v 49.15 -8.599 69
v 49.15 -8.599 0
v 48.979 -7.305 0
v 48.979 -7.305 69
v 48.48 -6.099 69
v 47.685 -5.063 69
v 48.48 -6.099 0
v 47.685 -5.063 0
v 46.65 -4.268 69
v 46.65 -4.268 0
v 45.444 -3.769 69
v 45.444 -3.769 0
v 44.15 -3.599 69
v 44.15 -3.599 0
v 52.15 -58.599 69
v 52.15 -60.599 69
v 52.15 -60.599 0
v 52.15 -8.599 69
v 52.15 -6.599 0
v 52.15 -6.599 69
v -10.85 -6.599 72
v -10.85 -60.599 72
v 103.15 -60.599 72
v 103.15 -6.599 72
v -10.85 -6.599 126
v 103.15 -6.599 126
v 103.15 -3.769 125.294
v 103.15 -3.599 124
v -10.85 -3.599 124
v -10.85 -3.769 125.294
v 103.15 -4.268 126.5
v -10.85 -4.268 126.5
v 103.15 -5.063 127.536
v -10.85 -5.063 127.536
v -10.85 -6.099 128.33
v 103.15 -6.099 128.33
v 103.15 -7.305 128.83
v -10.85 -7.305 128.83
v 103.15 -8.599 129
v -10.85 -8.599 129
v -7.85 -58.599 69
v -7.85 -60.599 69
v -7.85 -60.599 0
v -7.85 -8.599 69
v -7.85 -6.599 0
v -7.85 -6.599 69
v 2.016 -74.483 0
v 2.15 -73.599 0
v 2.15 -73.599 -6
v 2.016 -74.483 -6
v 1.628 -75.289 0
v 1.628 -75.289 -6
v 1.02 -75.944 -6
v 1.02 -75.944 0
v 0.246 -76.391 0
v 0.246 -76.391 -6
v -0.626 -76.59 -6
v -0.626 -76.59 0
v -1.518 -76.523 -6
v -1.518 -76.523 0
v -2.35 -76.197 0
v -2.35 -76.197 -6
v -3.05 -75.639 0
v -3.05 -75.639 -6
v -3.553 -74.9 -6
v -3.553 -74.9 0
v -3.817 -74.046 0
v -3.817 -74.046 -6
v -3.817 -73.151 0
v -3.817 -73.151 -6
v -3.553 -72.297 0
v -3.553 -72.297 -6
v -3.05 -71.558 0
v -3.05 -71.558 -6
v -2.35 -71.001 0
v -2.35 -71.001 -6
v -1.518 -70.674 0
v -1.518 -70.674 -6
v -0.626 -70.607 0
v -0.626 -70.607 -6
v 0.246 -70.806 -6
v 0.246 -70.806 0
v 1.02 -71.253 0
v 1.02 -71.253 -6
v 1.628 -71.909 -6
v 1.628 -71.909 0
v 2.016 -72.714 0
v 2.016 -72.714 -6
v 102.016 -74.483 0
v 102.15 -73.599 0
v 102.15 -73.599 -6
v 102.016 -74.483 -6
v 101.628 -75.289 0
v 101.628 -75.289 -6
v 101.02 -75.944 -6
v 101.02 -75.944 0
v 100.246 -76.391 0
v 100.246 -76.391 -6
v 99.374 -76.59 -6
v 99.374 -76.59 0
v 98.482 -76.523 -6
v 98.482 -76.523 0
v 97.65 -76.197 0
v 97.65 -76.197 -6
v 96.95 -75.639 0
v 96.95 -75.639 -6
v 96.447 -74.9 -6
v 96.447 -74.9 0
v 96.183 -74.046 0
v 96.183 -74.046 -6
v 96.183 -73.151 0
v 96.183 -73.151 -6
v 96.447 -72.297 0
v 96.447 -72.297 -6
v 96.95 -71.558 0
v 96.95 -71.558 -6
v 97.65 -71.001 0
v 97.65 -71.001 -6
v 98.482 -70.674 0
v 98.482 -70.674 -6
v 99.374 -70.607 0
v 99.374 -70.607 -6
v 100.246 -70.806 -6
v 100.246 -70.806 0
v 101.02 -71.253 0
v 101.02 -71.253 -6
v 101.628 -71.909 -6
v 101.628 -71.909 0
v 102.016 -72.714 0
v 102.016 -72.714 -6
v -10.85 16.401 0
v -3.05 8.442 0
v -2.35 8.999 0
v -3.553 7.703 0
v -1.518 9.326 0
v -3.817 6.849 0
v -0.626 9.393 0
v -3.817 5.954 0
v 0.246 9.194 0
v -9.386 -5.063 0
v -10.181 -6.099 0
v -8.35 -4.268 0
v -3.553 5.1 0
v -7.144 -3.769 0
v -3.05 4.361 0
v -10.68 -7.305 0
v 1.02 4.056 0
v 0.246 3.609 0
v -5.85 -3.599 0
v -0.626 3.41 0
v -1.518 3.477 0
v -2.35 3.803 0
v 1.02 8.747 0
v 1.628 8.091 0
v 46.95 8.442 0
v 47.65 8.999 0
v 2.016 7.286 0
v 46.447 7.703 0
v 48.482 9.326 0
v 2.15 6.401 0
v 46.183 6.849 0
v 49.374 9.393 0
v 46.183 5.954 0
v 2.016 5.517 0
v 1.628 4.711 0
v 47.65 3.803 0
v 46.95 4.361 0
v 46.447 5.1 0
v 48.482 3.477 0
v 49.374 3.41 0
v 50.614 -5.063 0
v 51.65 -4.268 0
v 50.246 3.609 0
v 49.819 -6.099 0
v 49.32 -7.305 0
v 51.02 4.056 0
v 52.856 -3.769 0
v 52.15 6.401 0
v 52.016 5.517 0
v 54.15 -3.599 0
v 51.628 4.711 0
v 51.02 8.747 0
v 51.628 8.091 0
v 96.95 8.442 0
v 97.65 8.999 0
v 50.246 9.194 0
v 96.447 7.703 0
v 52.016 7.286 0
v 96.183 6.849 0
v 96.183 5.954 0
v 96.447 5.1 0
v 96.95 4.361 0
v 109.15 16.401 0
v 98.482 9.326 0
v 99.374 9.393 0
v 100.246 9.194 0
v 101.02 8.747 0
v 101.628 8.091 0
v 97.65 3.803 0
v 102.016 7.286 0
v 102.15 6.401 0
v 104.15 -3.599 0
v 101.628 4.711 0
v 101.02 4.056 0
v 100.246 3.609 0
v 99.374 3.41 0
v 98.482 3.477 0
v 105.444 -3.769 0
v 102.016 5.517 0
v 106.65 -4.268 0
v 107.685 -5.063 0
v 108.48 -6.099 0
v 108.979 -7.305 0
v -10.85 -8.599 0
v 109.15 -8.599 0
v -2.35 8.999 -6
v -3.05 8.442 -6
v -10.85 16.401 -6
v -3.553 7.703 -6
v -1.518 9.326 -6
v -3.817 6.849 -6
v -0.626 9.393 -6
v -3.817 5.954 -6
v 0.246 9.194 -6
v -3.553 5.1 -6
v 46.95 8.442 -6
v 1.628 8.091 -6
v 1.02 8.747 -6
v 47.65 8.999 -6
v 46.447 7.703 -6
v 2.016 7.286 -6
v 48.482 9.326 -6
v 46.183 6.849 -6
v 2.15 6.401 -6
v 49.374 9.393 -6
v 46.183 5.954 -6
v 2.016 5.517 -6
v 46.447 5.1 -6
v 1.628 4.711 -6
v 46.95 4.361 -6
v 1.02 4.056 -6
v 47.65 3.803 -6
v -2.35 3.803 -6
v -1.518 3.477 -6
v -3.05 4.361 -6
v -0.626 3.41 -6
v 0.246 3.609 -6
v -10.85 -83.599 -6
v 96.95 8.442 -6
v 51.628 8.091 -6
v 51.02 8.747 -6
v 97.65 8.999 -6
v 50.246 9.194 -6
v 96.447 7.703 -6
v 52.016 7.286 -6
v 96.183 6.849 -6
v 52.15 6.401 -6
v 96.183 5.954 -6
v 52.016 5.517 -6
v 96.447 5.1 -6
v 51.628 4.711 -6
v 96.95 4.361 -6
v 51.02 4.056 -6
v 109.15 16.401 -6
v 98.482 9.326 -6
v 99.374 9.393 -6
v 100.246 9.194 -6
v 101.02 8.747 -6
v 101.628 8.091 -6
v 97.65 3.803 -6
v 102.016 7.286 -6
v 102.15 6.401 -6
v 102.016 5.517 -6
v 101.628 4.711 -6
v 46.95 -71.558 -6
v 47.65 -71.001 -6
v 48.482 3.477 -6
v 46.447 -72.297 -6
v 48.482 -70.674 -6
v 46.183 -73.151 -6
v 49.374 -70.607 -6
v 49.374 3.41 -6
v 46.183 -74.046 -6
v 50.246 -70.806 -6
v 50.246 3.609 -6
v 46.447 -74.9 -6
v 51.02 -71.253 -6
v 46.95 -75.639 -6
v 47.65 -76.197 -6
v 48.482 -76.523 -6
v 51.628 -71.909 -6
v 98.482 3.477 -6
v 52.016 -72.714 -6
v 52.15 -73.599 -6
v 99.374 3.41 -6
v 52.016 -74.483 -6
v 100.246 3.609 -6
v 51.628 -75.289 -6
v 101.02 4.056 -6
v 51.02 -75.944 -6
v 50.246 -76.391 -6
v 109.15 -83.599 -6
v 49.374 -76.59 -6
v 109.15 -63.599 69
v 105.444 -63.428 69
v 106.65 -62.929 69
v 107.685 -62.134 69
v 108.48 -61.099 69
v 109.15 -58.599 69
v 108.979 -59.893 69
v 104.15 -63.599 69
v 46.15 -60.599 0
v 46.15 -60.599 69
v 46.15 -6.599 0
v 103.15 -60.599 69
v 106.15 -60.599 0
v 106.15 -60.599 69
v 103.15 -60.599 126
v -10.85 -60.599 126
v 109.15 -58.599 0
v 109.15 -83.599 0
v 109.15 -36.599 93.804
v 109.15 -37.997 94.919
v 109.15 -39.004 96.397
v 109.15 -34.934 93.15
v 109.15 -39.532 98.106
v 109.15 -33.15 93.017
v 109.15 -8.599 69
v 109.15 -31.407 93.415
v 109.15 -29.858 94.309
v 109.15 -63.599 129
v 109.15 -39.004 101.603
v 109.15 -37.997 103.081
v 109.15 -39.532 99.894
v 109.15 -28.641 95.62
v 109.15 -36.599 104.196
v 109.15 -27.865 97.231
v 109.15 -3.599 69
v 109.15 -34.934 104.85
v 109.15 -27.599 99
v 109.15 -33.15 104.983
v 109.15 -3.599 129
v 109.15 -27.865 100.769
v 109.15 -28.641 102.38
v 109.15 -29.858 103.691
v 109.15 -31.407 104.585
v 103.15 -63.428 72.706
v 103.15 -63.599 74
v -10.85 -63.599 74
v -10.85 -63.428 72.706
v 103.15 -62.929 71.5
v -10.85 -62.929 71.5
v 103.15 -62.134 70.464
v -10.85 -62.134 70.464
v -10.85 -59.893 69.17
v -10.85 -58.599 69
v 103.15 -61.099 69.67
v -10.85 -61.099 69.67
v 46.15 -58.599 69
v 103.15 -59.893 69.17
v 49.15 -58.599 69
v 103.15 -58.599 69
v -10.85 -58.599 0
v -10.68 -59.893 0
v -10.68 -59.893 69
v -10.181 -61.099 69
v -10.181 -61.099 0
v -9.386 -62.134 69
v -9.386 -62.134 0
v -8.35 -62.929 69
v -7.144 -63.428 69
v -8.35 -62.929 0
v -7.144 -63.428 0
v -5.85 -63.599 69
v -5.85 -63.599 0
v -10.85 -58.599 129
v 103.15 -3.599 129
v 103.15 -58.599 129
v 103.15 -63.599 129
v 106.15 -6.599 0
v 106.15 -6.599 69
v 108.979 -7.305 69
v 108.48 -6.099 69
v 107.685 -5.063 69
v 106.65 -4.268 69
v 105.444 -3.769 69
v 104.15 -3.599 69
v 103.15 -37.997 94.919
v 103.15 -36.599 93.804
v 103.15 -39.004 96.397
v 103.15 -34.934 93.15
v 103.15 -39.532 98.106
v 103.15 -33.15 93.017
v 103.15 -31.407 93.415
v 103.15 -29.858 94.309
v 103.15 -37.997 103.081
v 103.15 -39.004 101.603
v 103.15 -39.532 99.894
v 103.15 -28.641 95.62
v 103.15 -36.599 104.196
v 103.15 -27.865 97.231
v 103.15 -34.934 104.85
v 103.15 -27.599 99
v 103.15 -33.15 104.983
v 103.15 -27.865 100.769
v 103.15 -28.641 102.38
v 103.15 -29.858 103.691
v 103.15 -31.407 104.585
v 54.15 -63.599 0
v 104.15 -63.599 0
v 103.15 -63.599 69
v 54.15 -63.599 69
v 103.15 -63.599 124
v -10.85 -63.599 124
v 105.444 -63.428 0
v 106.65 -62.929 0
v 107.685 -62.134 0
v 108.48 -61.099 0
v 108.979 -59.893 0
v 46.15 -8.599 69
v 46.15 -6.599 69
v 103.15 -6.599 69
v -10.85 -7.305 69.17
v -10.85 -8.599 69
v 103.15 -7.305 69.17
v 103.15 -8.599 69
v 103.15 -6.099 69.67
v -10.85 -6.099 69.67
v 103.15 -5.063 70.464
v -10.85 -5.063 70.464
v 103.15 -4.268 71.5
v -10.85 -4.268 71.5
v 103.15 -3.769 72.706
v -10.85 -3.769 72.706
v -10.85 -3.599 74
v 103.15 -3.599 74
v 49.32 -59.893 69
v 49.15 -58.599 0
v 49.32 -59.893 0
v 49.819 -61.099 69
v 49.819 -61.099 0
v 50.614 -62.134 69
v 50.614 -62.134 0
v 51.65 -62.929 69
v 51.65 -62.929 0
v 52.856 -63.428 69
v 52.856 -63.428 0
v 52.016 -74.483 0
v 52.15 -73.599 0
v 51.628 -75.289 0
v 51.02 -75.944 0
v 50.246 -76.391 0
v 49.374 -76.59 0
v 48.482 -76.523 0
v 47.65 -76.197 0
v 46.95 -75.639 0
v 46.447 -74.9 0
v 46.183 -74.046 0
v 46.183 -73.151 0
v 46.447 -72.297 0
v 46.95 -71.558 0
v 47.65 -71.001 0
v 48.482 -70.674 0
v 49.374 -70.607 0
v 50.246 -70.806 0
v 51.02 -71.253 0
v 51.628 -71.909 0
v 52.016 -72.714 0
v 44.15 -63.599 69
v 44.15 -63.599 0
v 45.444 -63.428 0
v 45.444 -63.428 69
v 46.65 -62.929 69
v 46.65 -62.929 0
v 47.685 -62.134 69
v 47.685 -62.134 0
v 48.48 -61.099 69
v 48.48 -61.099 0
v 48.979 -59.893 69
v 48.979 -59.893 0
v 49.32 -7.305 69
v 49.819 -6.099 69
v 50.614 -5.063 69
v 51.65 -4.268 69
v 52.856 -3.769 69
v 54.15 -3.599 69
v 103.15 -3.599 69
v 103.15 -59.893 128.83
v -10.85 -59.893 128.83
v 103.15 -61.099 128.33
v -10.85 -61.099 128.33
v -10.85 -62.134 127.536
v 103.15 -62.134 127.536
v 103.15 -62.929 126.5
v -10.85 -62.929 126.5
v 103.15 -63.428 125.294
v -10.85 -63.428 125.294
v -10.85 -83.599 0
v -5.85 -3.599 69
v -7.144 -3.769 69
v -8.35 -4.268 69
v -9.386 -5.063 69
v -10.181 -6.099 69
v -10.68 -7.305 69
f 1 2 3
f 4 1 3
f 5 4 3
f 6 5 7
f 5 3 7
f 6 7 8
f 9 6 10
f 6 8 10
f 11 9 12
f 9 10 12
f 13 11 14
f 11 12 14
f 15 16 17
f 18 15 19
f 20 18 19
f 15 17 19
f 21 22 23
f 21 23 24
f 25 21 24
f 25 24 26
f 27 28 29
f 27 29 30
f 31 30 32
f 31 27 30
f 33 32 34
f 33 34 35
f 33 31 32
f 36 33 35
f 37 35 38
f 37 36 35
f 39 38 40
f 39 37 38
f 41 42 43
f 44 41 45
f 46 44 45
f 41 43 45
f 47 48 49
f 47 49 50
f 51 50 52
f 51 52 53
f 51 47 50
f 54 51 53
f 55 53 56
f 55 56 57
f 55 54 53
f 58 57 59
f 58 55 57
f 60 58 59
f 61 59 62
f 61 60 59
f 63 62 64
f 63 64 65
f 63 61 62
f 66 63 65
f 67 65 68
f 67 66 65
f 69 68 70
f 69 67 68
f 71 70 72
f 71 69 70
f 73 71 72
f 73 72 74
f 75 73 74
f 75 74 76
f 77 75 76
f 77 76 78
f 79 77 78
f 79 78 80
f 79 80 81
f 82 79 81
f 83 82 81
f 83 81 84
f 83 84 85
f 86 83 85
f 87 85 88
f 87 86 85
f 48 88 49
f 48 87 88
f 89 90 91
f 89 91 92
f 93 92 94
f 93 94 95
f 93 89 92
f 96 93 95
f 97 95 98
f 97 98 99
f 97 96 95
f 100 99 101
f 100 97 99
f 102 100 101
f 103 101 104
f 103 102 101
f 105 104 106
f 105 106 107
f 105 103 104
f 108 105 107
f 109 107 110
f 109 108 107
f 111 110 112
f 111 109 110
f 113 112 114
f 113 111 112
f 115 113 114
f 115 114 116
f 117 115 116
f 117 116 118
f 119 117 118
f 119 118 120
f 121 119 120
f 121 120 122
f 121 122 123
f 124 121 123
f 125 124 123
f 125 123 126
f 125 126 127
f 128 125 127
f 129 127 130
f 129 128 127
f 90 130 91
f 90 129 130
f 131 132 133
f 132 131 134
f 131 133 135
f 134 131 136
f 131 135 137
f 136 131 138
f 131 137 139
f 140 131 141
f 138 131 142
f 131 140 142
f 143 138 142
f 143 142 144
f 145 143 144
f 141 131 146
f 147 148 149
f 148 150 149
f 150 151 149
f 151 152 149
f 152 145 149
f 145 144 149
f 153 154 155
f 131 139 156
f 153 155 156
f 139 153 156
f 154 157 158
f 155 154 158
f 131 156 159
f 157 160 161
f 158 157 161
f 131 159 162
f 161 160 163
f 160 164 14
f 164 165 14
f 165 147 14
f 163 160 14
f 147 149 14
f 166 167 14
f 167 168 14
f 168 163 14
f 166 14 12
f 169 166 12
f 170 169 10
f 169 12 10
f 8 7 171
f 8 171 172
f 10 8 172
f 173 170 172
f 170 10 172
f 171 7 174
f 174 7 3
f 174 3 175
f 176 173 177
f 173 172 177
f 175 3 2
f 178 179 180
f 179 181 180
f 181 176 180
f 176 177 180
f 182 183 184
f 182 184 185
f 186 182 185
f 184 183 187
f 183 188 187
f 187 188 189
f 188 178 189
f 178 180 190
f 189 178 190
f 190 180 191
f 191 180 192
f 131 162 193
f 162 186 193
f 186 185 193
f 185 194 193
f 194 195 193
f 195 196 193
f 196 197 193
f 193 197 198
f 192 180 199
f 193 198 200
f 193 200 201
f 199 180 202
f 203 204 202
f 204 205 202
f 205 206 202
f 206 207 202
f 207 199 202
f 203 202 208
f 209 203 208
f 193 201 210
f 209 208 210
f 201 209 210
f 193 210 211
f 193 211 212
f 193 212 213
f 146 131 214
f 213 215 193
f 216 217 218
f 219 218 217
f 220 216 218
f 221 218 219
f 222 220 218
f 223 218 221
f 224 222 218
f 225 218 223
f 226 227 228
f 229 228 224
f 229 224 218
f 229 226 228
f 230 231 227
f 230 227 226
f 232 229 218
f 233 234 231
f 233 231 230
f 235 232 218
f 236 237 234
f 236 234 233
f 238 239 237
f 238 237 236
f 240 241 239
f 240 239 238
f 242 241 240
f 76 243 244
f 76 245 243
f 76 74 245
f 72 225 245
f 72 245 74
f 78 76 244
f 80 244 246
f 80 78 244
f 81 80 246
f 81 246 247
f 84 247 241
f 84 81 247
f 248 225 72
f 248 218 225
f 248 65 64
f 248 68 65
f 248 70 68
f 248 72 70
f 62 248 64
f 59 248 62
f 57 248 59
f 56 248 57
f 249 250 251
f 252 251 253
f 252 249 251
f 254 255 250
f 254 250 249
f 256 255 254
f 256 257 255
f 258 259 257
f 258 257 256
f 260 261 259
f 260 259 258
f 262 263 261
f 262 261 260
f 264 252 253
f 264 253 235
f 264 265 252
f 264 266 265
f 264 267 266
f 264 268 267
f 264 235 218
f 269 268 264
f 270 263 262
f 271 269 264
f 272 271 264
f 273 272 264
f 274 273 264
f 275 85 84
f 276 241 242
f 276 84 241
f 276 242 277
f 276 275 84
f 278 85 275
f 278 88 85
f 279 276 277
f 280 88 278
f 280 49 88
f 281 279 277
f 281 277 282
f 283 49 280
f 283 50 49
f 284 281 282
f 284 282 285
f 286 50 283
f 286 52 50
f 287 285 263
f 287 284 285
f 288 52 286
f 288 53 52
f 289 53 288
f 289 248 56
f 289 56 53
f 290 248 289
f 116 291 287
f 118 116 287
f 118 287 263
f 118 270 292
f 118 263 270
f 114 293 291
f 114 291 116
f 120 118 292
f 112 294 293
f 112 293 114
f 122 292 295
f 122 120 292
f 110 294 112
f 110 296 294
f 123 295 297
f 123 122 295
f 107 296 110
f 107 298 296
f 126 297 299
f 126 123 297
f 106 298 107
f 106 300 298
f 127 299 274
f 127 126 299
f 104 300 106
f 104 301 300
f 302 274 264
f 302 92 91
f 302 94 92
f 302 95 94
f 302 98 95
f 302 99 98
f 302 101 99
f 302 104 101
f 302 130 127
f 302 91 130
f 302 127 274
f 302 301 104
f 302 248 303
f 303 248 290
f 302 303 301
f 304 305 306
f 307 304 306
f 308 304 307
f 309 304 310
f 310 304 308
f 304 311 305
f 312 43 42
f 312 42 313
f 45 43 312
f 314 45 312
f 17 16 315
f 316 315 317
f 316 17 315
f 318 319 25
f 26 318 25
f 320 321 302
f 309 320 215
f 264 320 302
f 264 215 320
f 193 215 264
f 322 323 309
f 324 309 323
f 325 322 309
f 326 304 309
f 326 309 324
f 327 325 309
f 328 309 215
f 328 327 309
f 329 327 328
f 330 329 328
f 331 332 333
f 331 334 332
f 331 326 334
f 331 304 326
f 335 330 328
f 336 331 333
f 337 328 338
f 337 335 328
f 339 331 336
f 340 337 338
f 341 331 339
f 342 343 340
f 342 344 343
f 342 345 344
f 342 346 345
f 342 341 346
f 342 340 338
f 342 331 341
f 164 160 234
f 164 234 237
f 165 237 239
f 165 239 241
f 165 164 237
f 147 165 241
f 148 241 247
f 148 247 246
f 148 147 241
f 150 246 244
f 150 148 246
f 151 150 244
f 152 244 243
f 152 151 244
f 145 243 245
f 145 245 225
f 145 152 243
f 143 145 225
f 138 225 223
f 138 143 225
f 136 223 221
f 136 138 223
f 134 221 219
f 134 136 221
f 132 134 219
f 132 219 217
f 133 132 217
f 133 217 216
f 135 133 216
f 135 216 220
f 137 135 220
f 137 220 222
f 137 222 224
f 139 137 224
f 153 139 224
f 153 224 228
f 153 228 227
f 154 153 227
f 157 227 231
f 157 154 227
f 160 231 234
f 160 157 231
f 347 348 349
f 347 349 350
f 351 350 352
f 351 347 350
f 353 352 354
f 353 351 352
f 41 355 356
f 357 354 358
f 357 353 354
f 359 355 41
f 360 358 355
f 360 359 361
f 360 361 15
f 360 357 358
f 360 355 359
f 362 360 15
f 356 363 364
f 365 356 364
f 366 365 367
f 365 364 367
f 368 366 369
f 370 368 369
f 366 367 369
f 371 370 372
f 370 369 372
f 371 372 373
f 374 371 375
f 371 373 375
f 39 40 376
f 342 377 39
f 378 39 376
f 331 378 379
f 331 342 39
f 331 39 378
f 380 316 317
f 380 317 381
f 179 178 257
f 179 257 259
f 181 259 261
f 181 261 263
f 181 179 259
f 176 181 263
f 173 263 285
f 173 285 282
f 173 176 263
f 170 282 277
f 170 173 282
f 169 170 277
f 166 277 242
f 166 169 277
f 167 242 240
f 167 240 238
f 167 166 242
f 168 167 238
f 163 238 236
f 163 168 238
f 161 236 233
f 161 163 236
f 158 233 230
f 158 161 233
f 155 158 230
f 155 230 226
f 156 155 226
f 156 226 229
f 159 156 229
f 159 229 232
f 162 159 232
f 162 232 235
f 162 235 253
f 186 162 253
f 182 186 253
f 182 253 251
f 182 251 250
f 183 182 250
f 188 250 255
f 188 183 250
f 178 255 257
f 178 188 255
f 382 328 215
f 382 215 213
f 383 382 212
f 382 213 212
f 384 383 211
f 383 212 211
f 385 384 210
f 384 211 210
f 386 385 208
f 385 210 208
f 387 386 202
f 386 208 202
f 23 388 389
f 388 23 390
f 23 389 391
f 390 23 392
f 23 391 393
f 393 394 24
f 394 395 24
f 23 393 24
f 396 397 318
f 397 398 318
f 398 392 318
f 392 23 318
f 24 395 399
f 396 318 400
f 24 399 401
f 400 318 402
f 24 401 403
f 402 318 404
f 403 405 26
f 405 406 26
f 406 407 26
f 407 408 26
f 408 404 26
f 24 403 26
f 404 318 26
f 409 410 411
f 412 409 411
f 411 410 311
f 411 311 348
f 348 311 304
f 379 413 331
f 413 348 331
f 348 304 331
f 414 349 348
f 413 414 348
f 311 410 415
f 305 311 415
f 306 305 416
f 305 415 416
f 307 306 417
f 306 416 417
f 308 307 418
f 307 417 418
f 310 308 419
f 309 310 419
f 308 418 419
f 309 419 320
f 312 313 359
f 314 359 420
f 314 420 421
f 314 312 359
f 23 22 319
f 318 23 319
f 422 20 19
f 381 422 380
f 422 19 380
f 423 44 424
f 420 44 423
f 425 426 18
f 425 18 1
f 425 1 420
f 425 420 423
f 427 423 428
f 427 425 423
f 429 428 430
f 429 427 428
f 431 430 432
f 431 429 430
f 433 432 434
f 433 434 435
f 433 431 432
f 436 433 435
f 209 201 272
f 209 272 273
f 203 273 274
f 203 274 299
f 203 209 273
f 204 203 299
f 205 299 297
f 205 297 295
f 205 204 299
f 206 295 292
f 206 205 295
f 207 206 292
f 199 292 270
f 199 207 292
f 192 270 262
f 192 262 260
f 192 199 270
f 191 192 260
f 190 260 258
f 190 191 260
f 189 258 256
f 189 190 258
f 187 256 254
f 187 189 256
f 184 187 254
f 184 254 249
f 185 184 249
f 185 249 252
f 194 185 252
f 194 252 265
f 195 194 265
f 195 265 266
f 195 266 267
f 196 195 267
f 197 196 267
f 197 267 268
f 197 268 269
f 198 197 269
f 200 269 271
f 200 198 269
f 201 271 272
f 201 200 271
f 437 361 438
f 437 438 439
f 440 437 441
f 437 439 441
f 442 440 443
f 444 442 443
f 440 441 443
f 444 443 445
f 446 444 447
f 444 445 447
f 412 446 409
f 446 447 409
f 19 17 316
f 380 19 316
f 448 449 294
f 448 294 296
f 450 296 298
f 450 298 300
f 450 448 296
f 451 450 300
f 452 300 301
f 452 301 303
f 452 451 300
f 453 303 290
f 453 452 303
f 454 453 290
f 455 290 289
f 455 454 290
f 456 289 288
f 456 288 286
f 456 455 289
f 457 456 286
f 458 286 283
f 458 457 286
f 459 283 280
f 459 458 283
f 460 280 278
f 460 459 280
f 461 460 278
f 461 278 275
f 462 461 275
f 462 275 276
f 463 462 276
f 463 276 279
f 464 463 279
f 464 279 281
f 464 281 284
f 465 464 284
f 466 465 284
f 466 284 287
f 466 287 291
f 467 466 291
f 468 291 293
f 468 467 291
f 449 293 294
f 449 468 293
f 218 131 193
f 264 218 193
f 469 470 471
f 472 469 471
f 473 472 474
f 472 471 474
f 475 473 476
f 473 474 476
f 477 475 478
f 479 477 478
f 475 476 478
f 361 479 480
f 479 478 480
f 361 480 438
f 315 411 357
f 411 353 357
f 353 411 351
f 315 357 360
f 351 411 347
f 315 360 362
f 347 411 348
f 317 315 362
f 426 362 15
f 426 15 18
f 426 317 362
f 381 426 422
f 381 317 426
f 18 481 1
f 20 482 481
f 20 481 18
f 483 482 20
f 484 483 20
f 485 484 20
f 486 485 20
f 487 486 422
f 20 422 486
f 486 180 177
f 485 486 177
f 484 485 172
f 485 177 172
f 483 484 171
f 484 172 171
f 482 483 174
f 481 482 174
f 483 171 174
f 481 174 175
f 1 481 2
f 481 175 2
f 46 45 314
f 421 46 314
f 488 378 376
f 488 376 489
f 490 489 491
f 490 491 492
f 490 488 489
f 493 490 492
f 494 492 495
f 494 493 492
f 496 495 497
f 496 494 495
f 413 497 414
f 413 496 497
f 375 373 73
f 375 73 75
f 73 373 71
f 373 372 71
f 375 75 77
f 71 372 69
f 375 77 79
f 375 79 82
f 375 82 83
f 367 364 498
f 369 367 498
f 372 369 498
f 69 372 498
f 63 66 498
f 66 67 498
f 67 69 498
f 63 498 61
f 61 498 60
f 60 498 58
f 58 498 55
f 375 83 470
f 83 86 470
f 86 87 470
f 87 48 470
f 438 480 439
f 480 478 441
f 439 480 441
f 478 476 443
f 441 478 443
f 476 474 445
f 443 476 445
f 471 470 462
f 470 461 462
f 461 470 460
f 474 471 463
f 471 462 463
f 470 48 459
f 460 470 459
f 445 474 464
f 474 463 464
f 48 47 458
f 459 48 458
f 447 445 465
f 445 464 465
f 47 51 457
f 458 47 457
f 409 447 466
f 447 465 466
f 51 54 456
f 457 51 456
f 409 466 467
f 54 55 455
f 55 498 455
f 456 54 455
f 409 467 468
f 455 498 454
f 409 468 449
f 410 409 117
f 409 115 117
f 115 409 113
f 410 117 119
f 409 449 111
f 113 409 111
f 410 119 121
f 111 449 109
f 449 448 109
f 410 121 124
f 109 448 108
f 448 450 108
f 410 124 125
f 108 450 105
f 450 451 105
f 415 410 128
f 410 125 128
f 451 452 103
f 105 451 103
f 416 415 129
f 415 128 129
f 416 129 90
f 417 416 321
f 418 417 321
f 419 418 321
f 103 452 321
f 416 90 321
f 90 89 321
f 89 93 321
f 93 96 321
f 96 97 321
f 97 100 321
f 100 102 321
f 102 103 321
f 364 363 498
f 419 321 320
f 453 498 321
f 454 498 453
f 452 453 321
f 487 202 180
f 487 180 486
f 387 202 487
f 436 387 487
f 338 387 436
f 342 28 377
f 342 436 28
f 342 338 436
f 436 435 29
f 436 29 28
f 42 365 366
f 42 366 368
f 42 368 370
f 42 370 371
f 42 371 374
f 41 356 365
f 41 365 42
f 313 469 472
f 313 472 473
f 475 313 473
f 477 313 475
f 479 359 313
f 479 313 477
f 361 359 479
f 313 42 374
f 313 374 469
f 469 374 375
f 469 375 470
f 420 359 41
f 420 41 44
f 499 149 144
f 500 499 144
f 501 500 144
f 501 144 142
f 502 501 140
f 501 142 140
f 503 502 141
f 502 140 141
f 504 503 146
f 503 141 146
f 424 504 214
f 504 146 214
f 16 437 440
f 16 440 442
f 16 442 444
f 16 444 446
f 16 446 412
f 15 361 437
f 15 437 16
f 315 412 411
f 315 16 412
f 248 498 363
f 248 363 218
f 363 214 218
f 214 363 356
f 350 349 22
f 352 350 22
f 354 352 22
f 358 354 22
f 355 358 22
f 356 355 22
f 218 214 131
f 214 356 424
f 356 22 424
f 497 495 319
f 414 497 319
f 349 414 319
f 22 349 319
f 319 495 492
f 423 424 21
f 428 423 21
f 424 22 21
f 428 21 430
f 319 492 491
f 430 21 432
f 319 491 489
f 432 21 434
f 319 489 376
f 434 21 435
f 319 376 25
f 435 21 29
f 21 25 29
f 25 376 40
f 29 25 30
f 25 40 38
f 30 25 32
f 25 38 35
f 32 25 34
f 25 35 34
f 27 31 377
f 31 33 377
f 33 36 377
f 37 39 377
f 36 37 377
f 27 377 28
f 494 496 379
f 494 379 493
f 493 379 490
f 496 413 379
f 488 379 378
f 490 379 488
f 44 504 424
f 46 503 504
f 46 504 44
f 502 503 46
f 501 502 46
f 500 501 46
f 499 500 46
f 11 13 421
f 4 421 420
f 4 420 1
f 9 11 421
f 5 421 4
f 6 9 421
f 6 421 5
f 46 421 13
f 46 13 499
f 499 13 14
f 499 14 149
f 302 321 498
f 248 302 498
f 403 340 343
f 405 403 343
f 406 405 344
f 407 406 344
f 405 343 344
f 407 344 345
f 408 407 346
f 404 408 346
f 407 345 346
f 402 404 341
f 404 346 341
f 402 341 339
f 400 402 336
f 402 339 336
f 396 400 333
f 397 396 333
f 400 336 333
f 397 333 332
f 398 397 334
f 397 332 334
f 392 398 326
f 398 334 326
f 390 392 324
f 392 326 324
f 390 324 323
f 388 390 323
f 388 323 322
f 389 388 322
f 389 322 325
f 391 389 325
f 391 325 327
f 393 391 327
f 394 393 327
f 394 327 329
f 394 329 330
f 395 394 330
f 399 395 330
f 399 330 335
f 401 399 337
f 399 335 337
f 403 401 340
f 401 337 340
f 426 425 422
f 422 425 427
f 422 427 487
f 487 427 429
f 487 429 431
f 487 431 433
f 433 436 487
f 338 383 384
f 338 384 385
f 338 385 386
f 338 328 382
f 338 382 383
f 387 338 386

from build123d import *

# Parameters (mm, degrees)
F0_W     = 54
F0_H     = 54
F1_DEPTH = 69
F2_R     = 3
F2_W     = 54
F2_H     = 54
F3_DEPTH = 6
F4_W     = 54
F4_H     = 54
F5_DEPTH = 120
F6_W     = 60
F6_H     = 60
F6_R     = 6
F7_DEPTH = 6


with BuildPart() as f1:
    # F0 (on Top) → F1 (new body)
    with BuildSketch(Plane.XY):
        with BuildLine():
            ThreePointArc((-5.85040465, -3.5986092687), (-9.3859385559, -5.0630753627), (-10.85040465, -8.5986092687))
            Line((-10.85040465, -8.5986092687), (-10.85040465, -58.5986092687))
            ThreePointArc((-10.85040465, -58.5986092687), (-9.3859385559, -62.1341431746), (-5.85040465, -63.5986092687))
            Line((-5.85040465, -63.5986092687), (44.14959535, -63.5986092687))
            ThreePointArc((44.14959535, -63.5986092687), (47.685129256, -62.1341431746), (49.14959535, -58.5986092687))
            Line((49.14959535, -58.5986092687), (49.14959535, -8.5986092687))
            ThreePointArc((49.14959535, -8.5986092687), (47.685129256, -5.0630753627), (44.14959535, -3.5986092687))
            Line((44.14959535, -3.5986092687), (-5.85040465, -3.5986092687))
        make_face()
        with Locations((19.14959535, -33.5986092687)):
            Rectangle(F0_W, F0_H, mode=Mode.SUBTRACT)
        with BuildLine():
            ThreePointArc((54.14959535, -3.5986092687), (50.6140614441, -5.0630753627), (49.14959535, -8.5986092687))
            Line((49.14959535, -8.5986092687), (49.14959535, -58.5986092687))
            ThreePointArc((49.14959535, -58.5986092687), (50.6140614441, -62.1341431746), (54.14959535, -63.5986092687))
            Line((54.14959535, -63.5986092687), (104.14959535, -63.5986092687))
            ThreePointArc((104.14959535, -63.5986092687), (107.685129256, -62.1341431746), (109.14959535, -58.5986092687))
            Line((109.14959535, -58.5986092687), (109.14959535, -8.5986092687))
            ThreePointArc((109.14959535, -8.5986092687), (107.685129256, -5.0630753627), (104.14959535, -3.5986092687))
            Line((104.14959535, -3.5986092687), (54.14959535, -3.5986092687))
        make_face()
        with Locations((79.14959535, -33.5986092687)):
            Rectangle(F0_W, F0_H, mode=Mode.SUBTRACT)
    extrude(amount=F1_DEPTH)

    # F2 (on face) → F3 (join)
    with BuildSketch(Plane(origin=(0, 0, 0), x_dir=(1, 0, 0), z_dir=(0, 0, -1))):
        with BuildLine():
            Line((-10.85040465, -16.4013907313), (109.14959535, -16.4013907313))
            Line((109.14959535, -16.4013907313), (109.14959535, 8.5986092687))
            ThreePointArc((109.14959535, 8.5986092687), (107.685129256, 5.0630753627), (104.14959535, 3.5986092687))
            Line((104.14959535, 3.5986092687), (54.14959535, 3.5986092687))
            ThreePointArc((54.14959535, 3.5986092687), (50.6140614441, 5.0630753627), (49.14959535, 8.5986092687))
            ThreePointArc((49.14959535, 8.5986092687), (47.685129256, 5.0630753627), (44.14959535, 3.5986092687))
            Line((44.14959535, 3.5986092687), (-5.85040465, 3.5986092687))
            ThreePointArc((-5.85040465, 3.5986092687), (-9.3859385559, 5.0630753627), (-10.85040465, 8.5986092687))
            Line((-10.85040465, 8.5986092687), (-10.85040465, -16.4013907313))
        make_face()
        with Locations((-0.85040465, -6.4013907313)):
            Circle(F2_R, mode=Mode.SUBTRACT)
        with Locations((49.14959535, -6.4013907313)):
            Circle(F2_R, mode=Mode.SUBTRACT)
        with Locations((99.14959535, -6.4013907313)):
            Circle(F2_R, mode=Mode.SUBTRACT)
        with BuildLine():
            ThreePointArc((104.14959535, 63.5986092687), (107.685129256, 62.1341431746), (109.14959535, 58.5986092687))
            Line((109.14959535, 58.5986092687), (109.14959535, 83.5986092687))
            Line((109.14959535, 83.5986092687), (-10.85040465, 83.5986092687))
            Line((-10.85040465, 83.5986092687), (-10.85040465, 58.5986092687))
            ThreePointArc((-10.85040465, 58.5986092687), (-9.3859385559, 62.1341431746), (-5.85040465, 63.5986092687))
            Line((-5.85040465, 63.5986092687), (44.14959535, 63.5986092687))
            ThreePointArc((44.14959535, 63.5986092687), (47.685129256, 62.1341431746), (49.14959535, 58.5986092687))
            ThreePointArc((49.14959535, 58.5986092687), (50.6140614441, 62.1341431746), (54.14959535, 63.5986092687))
            Line((54.14959535, 63.5986092687), (104.14959535, 63.5986092687))
        make_face()
        with Locations((-0.85040465, 73.5986092687)):
            Circle(F2_R, mode=Mode.SUBTRACT)
        with Locations((49.14959535, 73.5986092687)):
            Circle(F2_R, mode=Mode.SUBTRACT)
        with Locations((99.14959535, 73.5986092687)):
            Circle(F2_R, mode=Mode.SUBTRACT)
        with BuildLine():
            ThreePointArc((104.14959535, 3.5986092687), (107.685129256, 5.0630753627), (109.14959535, 8.5986092687))
            Line((109.14959535, 8.5986092687), (109.14959535, 58.5986092687))
            ThreePointArc((109.14959535, 58.5986092687), (107.685129256, 62.1341431746), (104.14959535, 63.5986092687))
            Line((104.14959535, 63.5986092687), (54.14959535, 63.5986092687))
            ThreePointArc((54.14959535, 63.5986092687), (50.6140614441, 62.1341431746), (49.14959535, 58.5986092687))
            ThreePointArc((49.14959535, 58.5986092687), (47.685129256, 62.1341431746), (44.14959535, 63.5986092687))
            Line((44.14959535, 63.5986092687), (-5.85040465, 63.5986092687))
            ThreePointArc((-5.85040465, 63.5986092687), (-9.3859385559, 62.1341431746), (-10.85040465, 58.5986092687))
            Line((-10.85040465, 58.5986092687), (-10.85040465, 8.5986092687))
            ThreePointArc((-10.85040465, 8.5986092687), (-9.3859385559, 5.0630753627), (-5.85040465, 3.5986092687))
            Line((-5.85040465, 3.5986092687), (44.14959535, 3.5986092687))
            ThreePointArc((44.14959535, 3.5986092687), (47.685129256, 5.0630753627), (49.14959535, 8.5986092687))
            ThreePointArc((49.14959535, 8.5986092687), (50.6140614441, 5.0630753627), (54.14959535, 3.5986092687))
            Line((54.14959535, 3.5986092687), (104.14959535, 3.5986092687))
        make_face()
        with Locations((19.14959535, 33.5986092687)):
            Rectangle(F2_W, F2_H, mode=Mode.SUBTRACT)
        with Locations((79.14959535, 33.5986092687)):
            Rectangle(F2_W, F2_H, mode=Mode.SUBTRACT)
        with Locations((19.14959535, 33.5986092687)):
            Rectangle(F2_W, F2_H)
        with Locations((79.14959535, 33.5986092687)):
            Rectangle(F2_W, F2_H)
    extrude(amount=F3_DEPTH)

    # F4 (on face) → F5 (join, through all)
    with BuildSketch(Plane.YZ.offset(109.14959535)):
        with BuildLine():
            ThreePointArc((-3.5986092687, 124), (-5.0630753627, 127.5355339059), (-8.5986092687, 129))
            Line((-8.5986092687, 129), (-58.5986092687, 129))
            ThreePointArc((-58.5986092687, 129), (-62.1341431746, 127.5355339059), (-63.5986092687, 124))
            Line((-63.5986092687, 124), (-63.5986092687, 74))
            ThreePointArc((-63.5986092687, 74), (-62.1341431746, 70.4644660941), (-58.5986092687, 69))
            Line((-58.5986092687, 69), (-8.5986092687, 69))
            ThreePointArc((-8.5986092687, 69), (-5.0630753627, 70.4644660941), (-3.5986092687, 74))
            Line((-3.5986092687, 74), (-3.5986092687, 124))
        make_face()
        with Locations((-33.5986092687, 99)):
            Rectangle(F4_W, F4_H, mode=Mode.SUBTRACT)
    extrude(amount=-F5_DEPTH)

    # F6 (on face) → F7 (join)
    with BuildSketch(Plane.YZ.offset(109.14959535)):
        with Locations((-33.5986092687, 99)):
            Rectangle(F6_W, F6_H)
        with Locations((-33.5986092687, 99)):
            Circle(F6_R, mode=Mode.SUBTRACT)
    extrude(amount=-F7_DEPTH)


solid = f1.part
